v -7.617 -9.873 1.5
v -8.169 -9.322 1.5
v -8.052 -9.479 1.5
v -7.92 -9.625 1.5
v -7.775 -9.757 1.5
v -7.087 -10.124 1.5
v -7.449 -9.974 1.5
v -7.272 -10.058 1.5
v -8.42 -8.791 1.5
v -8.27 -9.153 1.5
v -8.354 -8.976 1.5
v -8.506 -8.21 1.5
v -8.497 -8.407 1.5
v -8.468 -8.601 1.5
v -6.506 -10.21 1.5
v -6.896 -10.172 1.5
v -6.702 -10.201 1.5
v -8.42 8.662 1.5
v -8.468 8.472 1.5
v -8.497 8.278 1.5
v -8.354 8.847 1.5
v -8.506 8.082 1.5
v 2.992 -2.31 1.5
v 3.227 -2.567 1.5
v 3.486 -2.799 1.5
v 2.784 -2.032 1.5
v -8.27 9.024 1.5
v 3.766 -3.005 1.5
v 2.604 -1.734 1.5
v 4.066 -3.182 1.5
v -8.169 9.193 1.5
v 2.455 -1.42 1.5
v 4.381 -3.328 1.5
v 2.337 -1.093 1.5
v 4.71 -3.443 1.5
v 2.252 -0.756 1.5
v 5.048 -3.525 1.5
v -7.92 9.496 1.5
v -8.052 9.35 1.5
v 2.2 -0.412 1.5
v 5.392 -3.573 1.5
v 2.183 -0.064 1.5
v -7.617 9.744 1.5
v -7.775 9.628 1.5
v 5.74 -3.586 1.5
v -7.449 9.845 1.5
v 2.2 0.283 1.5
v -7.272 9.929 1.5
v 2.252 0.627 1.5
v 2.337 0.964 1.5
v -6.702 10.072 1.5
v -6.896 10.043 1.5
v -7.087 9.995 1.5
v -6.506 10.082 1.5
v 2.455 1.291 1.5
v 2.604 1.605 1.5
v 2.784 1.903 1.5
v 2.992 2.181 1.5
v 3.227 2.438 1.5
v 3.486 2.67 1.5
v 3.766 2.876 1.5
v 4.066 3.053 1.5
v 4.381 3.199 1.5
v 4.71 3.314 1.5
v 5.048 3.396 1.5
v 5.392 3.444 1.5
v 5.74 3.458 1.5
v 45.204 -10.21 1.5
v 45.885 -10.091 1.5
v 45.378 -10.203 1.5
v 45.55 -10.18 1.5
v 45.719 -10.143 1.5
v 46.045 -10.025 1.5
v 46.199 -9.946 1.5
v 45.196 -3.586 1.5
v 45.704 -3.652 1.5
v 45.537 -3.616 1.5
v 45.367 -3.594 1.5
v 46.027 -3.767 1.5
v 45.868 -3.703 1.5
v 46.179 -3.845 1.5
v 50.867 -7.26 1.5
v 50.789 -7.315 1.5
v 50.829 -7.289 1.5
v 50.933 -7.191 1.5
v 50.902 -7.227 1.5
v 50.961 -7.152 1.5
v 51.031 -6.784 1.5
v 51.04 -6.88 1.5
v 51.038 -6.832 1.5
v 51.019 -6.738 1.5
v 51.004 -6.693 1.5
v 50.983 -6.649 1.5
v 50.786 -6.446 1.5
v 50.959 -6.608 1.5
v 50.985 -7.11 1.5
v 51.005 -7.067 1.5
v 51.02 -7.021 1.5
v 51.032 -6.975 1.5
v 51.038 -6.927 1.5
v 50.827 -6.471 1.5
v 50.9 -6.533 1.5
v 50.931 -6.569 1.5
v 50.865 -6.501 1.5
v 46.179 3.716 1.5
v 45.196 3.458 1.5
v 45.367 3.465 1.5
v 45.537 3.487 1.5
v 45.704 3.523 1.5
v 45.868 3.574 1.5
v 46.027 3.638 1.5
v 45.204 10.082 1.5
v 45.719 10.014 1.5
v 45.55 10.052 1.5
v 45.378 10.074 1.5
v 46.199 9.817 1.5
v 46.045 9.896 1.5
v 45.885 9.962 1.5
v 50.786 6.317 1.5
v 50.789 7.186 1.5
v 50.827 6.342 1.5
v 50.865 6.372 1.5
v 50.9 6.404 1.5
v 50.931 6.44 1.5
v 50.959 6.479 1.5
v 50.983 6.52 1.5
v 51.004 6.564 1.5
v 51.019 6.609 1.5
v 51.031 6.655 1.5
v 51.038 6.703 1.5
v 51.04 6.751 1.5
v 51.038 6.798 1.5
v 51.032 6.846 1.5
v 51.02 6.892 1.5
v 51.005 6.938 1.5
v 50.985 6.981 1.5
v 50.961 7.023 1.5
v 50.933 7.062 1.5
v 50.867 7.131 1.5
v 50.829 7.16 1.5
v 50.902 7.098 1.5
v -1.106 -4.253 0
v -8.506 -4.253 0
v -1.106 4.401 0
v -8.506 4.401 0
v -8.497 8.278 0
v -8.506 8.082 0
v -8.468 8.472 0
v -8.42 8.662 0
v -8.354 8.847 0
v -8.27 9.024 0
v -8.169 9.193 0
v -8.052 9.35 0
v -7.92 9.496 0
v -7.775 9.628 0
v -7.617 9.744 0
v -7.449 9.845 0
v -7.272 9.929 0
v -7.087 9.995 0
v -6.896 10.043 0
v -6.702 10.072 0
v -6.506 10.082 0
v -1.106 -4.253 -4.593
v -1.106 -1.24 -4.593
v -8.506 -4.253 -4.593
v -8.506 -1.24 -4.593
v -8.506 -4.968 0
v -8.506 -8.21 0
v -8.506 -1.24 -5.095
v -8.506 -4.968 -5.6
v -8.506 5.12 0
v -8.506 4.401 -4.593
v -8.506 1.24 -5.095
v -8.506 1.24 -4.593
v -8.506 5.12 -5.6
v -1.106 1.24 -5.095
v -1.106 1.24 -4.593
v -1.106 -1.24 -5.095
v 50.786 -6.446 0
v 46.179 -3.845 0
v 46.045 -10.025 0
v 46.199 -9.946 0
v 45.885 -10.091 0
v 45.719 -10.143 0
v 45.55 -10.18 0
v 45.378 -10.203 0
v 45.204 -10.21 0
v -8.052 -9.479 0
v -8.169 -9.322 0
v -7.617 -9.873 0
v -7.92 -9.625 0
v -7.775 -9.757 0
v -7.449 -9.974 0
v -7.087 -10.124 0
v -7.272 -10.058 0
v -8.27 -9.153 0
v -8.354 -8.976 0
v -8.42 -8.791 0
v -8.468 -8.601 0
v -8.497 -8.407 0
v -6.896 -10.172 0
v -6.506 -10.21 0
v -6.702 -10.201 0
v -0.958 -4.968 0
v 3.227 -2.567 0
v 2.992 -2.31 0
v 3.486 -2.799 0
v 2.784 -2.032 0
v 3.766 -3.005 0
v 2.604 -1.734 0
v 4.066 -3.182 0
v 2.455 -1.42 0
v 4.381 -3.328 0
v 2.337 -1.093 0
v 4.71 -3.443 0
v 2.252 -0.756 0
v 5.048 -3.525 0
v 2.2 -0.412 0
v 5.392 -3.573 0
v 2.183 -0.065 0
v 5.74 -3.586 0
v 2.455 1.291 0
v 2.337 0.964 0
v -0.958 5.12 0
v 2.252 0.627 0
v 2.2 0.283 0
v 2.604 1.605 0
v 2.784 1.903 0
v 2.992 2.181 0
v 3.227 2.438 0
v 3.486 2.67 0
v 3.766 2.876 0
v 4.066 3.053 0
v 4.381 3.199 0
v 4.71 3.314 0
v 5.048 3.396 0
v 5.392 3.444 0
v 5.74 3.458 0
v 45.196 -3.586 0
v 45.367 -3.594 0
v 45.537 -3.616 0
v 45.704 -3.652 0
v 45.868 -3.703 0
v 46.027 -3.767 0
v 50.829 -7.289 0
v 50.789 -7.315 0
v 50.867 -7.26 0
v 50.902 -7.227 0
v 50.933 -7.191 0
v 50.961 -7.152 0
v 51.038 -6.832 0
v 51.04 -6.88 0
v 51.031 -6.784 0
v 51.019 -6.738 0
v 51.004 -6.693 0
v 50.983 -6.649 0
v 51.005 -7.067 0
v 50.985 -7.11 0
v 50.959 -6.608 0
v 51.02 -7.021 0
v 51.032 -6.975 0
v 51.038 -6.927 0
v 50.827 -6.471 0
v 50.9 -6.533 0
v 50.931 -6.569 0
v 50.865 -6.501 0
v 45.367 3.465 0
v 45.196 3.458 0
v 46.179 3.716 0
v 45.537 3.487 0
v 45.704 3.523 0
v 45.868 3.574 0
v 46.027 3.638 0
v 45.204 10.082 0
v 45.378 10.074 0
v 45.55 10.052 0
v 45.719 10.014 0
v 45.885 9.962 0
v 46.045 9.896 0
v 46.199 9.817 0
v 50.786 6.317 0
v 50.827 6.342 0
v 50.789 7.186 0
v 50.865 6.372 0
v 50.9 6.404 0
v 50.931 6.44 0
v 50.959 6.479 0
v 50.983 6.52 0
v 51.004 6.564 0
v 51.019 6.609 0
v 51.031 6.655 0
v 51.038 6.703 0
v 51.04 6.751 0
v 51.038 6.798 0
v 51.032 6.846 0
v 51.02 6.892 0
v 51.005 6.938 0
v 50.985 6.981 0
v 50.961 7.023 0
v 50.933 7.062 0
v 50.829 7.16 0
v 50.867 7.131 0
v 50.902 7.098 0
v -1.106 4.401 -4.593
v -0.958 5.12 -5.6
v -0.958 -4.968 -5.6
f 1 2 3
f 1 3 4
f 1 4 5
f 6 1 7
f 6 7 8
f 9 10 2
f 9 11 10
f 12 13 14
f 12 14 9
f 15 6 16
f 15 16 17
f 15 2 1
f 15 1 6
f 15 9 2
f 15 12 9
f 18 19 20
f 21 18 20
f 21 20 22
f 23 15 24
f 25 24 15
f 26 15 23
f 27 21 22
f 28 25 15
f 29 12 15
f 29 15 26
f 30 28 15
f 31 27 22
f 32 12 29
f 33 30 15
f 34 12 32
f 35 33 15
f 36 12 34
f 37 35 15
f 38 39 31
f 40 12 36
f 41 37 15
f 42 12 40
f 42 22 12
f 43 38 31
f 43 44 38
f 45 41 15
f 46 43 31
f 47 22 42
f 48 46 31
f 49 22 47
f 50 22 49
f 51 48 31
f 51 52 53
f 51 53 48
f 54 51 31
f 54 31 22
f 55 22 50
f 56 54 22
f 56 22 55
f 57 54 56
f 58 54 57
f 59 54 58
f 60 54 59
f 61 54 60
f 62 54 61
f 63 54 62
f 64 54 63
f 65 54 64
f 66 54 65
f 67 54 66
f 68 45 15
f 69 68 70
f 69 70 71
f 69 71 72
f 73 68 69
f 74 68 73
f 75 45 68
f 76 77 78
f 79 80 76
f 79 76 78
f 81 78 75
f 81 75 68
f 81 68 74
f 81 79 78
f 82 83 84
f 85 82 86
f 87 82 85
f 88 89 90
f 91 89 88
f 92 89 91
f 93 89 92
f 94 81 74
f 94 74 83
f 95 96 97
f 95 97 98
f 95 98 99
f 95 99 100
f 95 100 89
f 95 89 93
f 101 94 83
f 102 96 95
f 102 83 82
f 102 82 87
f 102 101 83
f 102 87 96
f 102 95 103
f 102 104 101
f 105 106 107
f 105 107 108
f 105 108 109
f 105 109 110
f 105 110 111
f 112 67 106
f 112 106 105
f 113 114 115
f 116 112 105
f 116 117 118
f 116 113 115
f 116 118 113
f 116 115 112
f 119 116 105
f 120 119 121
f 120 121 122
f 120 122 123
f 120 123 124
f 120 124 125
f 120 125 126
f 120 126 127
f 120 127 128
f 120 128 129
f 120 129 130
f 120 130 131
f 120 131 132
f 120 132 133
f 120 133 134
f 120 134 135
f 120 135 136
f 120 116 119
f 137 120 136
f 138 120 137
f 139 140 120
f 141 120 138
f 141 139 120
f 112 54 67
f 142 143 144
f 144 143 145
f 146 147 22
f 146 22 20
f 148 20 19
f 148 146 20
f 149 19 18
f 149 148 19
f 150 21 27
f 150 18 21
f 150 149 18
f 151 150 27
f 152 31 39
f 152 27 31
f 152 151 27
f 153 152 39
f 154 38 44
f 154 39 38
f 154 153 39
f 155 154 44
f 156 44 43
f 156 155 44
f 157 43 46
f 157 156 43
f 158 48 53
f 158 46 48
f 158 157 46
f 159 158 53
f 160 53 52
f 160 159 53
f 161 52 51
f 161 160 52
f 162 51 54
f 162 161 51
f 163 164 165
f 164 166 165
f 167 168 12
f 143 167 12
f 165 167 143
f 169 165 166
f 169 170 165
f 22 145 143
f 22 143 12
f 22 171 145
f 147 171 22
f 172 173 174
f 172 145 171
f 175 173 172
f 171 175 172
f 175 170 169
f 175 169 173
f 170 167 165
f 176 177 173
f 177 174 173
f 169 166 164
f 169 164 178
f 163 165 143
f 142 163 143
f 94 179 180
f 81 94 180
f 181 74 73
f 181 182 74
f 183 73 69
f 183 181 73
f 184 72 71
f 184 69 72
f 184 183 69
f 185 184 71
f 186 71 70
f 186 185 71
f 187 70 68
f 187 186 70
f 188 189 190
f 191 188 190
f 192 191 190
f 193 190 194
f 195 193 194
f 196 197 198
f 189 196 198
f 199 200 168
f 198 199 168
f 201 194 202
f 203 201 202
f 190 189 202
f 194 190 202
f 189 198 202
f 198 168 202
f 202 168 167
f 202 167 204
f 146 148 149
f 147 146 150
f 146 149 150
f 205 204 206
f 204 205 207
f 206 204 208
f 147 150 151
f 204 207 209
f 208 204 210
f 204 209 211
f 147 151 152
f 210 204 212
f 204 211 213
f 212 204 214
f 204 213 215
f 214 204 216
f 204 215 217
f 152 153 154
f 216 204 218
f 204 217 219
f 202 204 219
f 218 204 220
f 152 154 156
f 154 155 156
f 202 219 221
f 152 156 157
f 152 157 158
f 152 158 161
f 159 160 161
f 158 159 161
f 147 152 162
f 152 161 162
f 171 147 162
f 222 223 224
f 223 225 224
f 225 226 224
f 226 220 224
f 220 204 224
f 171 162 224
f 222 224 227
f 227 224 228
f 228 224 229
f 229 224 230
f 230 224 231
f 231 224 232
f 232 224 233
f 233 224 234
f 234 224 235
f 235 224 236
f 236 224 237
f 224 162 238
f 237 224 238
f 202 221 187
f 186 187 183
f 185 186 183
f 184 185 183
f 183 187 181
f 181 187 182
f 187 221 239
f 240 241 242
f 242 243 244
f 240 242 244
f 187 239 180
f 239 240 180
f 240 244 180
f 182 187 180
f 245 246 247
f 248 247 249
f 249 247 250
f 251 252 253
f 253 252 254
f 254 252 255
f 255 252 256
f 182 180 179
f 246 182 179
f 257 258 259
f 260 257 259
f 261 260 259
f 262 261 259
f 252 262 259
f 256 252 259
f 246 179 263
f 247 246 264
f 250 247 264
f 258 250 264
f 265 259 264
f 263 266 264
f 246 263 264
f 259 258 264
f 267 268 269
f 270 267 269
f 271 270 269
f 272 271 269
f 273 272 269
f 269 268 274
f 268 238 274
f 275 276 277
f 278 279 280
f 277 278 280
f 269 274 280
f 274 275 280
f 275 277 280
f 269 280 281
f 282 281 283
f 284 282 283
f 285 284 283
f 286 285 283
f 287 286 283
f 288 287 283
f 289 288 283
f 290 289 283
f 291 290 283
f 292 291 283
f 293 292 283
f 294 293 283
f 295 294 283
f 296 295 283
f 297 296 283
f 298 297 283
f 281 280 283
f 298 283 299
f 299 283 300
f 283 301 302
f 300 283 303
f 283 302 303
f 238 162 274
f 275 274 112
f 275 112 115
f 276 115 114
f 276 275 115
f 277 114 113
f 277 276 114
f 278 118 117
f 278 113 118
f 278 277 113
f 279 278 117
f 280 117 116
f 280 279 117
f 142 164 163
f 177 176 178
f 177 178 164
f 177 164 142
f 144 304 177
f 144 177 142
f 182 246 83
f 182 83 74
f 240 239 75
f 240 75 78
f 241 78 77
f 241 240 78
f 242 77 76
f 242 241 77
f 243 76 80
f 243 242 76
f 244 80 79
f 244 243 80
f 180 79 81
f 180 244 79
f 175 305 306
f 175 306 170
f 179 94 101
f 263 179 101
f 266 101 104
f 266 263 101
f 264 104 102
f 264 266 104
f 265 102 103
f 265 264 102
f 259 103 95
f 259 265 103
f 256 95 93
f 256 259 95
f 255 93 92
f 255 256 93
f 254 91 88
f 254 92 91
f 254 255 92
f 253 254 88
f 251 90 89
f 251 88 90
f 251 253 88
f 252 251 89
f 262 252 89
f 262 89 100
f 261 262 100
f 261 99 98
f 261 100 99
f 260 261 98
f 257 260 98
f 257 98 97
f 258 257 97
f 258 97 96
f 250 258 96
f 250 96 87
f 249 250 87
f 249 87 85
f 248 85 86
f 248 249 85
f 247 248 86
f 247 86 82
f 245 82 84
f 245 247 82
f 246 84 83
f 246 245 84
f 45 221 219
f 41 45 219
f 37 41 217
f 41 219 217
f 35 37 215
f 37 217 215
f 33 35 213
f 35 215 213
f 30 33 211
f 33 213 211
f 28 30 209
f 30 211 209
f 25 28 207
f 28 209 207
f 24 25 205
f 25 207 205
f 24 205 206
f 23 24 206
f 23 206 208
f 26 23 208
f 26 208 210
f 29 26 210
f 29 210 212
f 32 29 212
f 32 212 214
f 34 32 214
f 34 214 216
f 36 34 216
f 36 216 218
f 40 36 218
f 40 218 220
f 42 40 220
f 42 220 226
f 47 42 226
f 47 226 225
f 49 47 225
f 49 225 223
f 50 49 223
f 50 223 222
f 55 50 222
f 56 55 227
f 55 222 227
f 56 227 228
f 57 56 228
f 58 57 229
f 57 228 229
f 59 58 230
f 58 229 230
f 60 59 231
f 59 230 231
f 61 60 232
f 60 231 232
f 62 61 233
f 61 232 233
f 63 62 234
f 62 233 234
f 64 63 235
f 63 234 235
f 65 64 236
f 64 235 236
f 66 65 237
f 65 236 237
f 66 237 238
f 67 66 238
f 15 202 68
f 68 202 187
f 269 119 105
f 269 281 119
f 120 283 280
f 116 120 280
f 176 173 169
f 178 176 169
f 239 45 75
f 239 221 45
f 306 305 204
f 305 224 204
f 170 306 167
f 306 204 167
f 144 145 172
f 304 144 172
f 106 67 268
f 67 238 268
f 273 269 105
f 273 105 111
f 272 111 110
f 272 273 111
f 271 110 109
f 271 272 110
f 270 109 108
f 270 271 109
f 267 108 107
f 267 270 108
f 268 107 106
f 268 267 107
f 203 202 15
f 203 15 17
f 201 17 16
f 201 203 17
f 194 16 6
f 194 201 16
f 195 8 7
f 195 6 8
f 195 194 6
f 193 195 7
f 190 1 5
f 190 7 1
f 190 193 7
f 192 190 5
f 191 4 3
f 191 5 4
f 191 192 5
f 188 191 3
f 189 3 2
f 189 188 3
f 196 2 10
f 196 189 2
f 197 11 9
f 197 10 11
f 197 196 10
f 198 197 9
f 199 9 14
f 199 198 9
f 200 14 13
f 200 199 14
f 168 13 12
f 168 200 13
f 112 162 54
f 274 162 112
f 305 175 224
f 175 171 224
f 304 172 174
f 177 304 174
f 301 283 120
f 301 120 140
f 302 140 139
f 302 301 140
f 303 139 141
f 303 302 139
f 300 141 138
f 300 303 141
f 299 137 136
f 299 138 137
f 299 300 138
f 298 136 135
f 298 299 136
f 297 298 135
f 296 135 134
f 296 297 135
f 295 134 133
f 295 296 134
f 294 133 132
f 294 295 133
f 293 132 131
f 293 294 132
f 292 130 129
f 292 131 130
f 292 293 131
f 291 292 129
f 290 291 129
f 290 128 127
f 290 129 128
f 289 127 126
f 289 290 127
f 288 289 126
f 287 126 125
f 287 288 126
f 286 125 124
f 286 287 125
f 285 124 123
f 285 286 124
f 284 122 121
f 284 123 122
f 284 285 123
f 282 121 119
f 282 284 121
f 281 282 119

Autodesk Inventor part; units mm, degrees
ref_plane "YZ Plane" through (0, 0, 0) normal (1, 0, 0) x (0, 1, 0)
ref_plane "XZ Plane" through (0, 0, 0) normal (0, 1, 0) x (-1, 0, 0)
ref_plane "XY Plane" through (0, 0, 0) normal (0, 0, 1) x (1, 0, 0)
sketch "Sketch1" plane through (0, 0, 0) normal (0, 0, 1) x (1, 0, 0)
  line L0 (-9.4004, -0.0645) -> (24.8301, -0.0645)
  line L1 (-8.5062, -0.0645) -> (-8.5062, 8.0815)
  line L2 (-6.5062, 10.0815) -> (45.2045, 10.0815)
  line L3 (5.7396, 3.4575) -> (45.196, 3.4575)
  line L4 (-8.5062, -0.0645) -> (-8.5062, -8.2105)
  line L5 (-6.5062, -10.2105) -> (45.2045, -10.2105)
  line L6 (5.7396, -3.5865) -> (45.196, -3.5865)
  line L7 (50.7891, 7.186) -> (46.1991, 9.8167)
  line L8 (50.7862, 6.3168) -> (46.1793, 3.7159)
  line L9 (50.7891, -7.315) -> (46.1991, -9.9457)
  line L10 (50.7862, -6.4458) -> (46.1793, -3.8449)
  arc A0 (5.7396, 3.4575) -> (5.7396, -3.5865) centre (5.7054, -0.0645) ccw
  arc A1 (-6.5062, 10.0815) -> (-8.5062, 8.0815) centre (-6.5062, 8.0815) ccw
  arc A2 (-8.5062, -8.2105) -> (-6.5062, -10.2105) centre (-6.5062, -8.2105) ccw
  arc A3 (46.1991, 9.8167) -> (45.2045, 10.0815) centre (45.2045, 8.0815) ccw
  arc A4 (45.196, 3.4575) -> (46.1793, 3.7159) centre (45.196, 5.4575) ccw
  arc A5 (50.7862, 6.3168) -> (50.7891, 7.186) centre (50.5404, 6.7522) ccw
  line L11 (50.7891, -7.315) -> (46.1991, -9.9457)
  line L12 (50.7862, -6.4458) -> (46.1793, -3.8449)
  arc A6 (45.2045, -10.2105) -> (46.1991, -9.9457) centre (45.2045, -8.2105) ccw
  arc A7 (46.1793, -3.8449) -> (45.196, -3.5865) centre (45.196, -5.5865) ccw
  arc A8 (50.7891, -7.315) -> (50.7862, -6.4458) centre (50.5404, -6.8812) ccw
  line L13 (5.7396, 3.4575) -> (5.7396, 10.0815)
  line L14 (5.7396, -3.5865) -> (5.7396, -10.2105)
  point P0 (0, 0)
  point P1 (51.4938, 10.0604)
  point P2 (51.4938, -10.1894)
  dimension "d7" = 6.624
  dimension "d11" = 2
  dimension "d12" = 2
  dimension "d13" = 0.5
extrude "Extrusion1" add sketch "Sketch1" along normal blind 1.5 contours L13 L2 A3 L7 A5 L8 A4 L3 | L6 A7 L10 A8 L9 A6 L5 L14
extrude "Extrusion2" add sketch "Sketch1" along normal blind 1.5 contours L1 A1 L2 L13 A0 L0 | L0 A0 L14 L5 A2 L4
split_face "Split1"
sketch "Sketch2" plane through (-8.5062, -8.2105, 0) normal (0, 0, -1) x (-1, 0, 0)
  line L0 (0, 16.292) -> (0, 0) projected
  line L1 (0, 13.3304) -> (-7.5479, 13.3304)
  line L2 (-7.5479, 13.3304) -> (-7.5479, 3.2425)
  line L3 (-7.5479, 3.2425) -> (0, 3.2425)
  line L4 (0, 3.2425) -> (0, 13.3304)
  line L5 (-8.5062, 8.2105) -> (18.1258, 8.2105)
  point P0 (0, 3.2425)
  dimension "d16" = 7.5479
  dimension "d17" = 10.0879
  dimension "d18" = 4.968
extrude "Extrusion3" add sketch "Sketch2" along normal blind 5.6
sketch "Sketch4" plane through (-8.5062, -8.2105, 1.5) normal (-1, 0, 0) x (0, 0, 1)
  line L0 (-1.5, 11.668) -> (-1.5, 18.292) projected
  line L1 (-6.093, 3.9575) -> (-1.5, 3.9575)
  line L2 (-1.5, 3.9575) -> (-1.5, 12.6111)
  line L3 (-1.5, 12.6111) -> (-6.093, 12.6111)
  line L4 (-7.1, 3.2425) -> (-7.1, 13.3304) projected
  line L5 (-1.5, 3.2425) -> (-7.1, 3.2425) projected
  line L6 (-1.5, 13.3304) -> (-7.1, 13.3304) projected
  line L7 (-1.5, 8.2105) -> (-9.0756, 8.2105)
  line L8 (-6.093, 6.97) -> (-6.5947, 6.97)
  line L9 (-6.5947, 6.97) -> (-6.5947, 8.2105)
  line L10 (-6.093, 9.4509) -> (-6.5947, 9.4509)
  line L11 (-6.5947, 9.4509) -> (-6.5947, 8.2105)
  line L12 (-6.093, 12.6111) -> (-6.093, 9.4509)
  line L13 (-6.093, 6.97) -> (-6.093, 3.9575)
  dimension "d22" = 0.715
  dimension "d23" = 0.7192
extrude "Extrusion4" cut sketch "Sketch4" against normal blind 7.4 contours L2 L7 L11 L10 L12 L3 L0 | L2 L1 L13 L8 L9 L7
properties part number "sensorhumedad" material "Brass, Soft Yellow"
